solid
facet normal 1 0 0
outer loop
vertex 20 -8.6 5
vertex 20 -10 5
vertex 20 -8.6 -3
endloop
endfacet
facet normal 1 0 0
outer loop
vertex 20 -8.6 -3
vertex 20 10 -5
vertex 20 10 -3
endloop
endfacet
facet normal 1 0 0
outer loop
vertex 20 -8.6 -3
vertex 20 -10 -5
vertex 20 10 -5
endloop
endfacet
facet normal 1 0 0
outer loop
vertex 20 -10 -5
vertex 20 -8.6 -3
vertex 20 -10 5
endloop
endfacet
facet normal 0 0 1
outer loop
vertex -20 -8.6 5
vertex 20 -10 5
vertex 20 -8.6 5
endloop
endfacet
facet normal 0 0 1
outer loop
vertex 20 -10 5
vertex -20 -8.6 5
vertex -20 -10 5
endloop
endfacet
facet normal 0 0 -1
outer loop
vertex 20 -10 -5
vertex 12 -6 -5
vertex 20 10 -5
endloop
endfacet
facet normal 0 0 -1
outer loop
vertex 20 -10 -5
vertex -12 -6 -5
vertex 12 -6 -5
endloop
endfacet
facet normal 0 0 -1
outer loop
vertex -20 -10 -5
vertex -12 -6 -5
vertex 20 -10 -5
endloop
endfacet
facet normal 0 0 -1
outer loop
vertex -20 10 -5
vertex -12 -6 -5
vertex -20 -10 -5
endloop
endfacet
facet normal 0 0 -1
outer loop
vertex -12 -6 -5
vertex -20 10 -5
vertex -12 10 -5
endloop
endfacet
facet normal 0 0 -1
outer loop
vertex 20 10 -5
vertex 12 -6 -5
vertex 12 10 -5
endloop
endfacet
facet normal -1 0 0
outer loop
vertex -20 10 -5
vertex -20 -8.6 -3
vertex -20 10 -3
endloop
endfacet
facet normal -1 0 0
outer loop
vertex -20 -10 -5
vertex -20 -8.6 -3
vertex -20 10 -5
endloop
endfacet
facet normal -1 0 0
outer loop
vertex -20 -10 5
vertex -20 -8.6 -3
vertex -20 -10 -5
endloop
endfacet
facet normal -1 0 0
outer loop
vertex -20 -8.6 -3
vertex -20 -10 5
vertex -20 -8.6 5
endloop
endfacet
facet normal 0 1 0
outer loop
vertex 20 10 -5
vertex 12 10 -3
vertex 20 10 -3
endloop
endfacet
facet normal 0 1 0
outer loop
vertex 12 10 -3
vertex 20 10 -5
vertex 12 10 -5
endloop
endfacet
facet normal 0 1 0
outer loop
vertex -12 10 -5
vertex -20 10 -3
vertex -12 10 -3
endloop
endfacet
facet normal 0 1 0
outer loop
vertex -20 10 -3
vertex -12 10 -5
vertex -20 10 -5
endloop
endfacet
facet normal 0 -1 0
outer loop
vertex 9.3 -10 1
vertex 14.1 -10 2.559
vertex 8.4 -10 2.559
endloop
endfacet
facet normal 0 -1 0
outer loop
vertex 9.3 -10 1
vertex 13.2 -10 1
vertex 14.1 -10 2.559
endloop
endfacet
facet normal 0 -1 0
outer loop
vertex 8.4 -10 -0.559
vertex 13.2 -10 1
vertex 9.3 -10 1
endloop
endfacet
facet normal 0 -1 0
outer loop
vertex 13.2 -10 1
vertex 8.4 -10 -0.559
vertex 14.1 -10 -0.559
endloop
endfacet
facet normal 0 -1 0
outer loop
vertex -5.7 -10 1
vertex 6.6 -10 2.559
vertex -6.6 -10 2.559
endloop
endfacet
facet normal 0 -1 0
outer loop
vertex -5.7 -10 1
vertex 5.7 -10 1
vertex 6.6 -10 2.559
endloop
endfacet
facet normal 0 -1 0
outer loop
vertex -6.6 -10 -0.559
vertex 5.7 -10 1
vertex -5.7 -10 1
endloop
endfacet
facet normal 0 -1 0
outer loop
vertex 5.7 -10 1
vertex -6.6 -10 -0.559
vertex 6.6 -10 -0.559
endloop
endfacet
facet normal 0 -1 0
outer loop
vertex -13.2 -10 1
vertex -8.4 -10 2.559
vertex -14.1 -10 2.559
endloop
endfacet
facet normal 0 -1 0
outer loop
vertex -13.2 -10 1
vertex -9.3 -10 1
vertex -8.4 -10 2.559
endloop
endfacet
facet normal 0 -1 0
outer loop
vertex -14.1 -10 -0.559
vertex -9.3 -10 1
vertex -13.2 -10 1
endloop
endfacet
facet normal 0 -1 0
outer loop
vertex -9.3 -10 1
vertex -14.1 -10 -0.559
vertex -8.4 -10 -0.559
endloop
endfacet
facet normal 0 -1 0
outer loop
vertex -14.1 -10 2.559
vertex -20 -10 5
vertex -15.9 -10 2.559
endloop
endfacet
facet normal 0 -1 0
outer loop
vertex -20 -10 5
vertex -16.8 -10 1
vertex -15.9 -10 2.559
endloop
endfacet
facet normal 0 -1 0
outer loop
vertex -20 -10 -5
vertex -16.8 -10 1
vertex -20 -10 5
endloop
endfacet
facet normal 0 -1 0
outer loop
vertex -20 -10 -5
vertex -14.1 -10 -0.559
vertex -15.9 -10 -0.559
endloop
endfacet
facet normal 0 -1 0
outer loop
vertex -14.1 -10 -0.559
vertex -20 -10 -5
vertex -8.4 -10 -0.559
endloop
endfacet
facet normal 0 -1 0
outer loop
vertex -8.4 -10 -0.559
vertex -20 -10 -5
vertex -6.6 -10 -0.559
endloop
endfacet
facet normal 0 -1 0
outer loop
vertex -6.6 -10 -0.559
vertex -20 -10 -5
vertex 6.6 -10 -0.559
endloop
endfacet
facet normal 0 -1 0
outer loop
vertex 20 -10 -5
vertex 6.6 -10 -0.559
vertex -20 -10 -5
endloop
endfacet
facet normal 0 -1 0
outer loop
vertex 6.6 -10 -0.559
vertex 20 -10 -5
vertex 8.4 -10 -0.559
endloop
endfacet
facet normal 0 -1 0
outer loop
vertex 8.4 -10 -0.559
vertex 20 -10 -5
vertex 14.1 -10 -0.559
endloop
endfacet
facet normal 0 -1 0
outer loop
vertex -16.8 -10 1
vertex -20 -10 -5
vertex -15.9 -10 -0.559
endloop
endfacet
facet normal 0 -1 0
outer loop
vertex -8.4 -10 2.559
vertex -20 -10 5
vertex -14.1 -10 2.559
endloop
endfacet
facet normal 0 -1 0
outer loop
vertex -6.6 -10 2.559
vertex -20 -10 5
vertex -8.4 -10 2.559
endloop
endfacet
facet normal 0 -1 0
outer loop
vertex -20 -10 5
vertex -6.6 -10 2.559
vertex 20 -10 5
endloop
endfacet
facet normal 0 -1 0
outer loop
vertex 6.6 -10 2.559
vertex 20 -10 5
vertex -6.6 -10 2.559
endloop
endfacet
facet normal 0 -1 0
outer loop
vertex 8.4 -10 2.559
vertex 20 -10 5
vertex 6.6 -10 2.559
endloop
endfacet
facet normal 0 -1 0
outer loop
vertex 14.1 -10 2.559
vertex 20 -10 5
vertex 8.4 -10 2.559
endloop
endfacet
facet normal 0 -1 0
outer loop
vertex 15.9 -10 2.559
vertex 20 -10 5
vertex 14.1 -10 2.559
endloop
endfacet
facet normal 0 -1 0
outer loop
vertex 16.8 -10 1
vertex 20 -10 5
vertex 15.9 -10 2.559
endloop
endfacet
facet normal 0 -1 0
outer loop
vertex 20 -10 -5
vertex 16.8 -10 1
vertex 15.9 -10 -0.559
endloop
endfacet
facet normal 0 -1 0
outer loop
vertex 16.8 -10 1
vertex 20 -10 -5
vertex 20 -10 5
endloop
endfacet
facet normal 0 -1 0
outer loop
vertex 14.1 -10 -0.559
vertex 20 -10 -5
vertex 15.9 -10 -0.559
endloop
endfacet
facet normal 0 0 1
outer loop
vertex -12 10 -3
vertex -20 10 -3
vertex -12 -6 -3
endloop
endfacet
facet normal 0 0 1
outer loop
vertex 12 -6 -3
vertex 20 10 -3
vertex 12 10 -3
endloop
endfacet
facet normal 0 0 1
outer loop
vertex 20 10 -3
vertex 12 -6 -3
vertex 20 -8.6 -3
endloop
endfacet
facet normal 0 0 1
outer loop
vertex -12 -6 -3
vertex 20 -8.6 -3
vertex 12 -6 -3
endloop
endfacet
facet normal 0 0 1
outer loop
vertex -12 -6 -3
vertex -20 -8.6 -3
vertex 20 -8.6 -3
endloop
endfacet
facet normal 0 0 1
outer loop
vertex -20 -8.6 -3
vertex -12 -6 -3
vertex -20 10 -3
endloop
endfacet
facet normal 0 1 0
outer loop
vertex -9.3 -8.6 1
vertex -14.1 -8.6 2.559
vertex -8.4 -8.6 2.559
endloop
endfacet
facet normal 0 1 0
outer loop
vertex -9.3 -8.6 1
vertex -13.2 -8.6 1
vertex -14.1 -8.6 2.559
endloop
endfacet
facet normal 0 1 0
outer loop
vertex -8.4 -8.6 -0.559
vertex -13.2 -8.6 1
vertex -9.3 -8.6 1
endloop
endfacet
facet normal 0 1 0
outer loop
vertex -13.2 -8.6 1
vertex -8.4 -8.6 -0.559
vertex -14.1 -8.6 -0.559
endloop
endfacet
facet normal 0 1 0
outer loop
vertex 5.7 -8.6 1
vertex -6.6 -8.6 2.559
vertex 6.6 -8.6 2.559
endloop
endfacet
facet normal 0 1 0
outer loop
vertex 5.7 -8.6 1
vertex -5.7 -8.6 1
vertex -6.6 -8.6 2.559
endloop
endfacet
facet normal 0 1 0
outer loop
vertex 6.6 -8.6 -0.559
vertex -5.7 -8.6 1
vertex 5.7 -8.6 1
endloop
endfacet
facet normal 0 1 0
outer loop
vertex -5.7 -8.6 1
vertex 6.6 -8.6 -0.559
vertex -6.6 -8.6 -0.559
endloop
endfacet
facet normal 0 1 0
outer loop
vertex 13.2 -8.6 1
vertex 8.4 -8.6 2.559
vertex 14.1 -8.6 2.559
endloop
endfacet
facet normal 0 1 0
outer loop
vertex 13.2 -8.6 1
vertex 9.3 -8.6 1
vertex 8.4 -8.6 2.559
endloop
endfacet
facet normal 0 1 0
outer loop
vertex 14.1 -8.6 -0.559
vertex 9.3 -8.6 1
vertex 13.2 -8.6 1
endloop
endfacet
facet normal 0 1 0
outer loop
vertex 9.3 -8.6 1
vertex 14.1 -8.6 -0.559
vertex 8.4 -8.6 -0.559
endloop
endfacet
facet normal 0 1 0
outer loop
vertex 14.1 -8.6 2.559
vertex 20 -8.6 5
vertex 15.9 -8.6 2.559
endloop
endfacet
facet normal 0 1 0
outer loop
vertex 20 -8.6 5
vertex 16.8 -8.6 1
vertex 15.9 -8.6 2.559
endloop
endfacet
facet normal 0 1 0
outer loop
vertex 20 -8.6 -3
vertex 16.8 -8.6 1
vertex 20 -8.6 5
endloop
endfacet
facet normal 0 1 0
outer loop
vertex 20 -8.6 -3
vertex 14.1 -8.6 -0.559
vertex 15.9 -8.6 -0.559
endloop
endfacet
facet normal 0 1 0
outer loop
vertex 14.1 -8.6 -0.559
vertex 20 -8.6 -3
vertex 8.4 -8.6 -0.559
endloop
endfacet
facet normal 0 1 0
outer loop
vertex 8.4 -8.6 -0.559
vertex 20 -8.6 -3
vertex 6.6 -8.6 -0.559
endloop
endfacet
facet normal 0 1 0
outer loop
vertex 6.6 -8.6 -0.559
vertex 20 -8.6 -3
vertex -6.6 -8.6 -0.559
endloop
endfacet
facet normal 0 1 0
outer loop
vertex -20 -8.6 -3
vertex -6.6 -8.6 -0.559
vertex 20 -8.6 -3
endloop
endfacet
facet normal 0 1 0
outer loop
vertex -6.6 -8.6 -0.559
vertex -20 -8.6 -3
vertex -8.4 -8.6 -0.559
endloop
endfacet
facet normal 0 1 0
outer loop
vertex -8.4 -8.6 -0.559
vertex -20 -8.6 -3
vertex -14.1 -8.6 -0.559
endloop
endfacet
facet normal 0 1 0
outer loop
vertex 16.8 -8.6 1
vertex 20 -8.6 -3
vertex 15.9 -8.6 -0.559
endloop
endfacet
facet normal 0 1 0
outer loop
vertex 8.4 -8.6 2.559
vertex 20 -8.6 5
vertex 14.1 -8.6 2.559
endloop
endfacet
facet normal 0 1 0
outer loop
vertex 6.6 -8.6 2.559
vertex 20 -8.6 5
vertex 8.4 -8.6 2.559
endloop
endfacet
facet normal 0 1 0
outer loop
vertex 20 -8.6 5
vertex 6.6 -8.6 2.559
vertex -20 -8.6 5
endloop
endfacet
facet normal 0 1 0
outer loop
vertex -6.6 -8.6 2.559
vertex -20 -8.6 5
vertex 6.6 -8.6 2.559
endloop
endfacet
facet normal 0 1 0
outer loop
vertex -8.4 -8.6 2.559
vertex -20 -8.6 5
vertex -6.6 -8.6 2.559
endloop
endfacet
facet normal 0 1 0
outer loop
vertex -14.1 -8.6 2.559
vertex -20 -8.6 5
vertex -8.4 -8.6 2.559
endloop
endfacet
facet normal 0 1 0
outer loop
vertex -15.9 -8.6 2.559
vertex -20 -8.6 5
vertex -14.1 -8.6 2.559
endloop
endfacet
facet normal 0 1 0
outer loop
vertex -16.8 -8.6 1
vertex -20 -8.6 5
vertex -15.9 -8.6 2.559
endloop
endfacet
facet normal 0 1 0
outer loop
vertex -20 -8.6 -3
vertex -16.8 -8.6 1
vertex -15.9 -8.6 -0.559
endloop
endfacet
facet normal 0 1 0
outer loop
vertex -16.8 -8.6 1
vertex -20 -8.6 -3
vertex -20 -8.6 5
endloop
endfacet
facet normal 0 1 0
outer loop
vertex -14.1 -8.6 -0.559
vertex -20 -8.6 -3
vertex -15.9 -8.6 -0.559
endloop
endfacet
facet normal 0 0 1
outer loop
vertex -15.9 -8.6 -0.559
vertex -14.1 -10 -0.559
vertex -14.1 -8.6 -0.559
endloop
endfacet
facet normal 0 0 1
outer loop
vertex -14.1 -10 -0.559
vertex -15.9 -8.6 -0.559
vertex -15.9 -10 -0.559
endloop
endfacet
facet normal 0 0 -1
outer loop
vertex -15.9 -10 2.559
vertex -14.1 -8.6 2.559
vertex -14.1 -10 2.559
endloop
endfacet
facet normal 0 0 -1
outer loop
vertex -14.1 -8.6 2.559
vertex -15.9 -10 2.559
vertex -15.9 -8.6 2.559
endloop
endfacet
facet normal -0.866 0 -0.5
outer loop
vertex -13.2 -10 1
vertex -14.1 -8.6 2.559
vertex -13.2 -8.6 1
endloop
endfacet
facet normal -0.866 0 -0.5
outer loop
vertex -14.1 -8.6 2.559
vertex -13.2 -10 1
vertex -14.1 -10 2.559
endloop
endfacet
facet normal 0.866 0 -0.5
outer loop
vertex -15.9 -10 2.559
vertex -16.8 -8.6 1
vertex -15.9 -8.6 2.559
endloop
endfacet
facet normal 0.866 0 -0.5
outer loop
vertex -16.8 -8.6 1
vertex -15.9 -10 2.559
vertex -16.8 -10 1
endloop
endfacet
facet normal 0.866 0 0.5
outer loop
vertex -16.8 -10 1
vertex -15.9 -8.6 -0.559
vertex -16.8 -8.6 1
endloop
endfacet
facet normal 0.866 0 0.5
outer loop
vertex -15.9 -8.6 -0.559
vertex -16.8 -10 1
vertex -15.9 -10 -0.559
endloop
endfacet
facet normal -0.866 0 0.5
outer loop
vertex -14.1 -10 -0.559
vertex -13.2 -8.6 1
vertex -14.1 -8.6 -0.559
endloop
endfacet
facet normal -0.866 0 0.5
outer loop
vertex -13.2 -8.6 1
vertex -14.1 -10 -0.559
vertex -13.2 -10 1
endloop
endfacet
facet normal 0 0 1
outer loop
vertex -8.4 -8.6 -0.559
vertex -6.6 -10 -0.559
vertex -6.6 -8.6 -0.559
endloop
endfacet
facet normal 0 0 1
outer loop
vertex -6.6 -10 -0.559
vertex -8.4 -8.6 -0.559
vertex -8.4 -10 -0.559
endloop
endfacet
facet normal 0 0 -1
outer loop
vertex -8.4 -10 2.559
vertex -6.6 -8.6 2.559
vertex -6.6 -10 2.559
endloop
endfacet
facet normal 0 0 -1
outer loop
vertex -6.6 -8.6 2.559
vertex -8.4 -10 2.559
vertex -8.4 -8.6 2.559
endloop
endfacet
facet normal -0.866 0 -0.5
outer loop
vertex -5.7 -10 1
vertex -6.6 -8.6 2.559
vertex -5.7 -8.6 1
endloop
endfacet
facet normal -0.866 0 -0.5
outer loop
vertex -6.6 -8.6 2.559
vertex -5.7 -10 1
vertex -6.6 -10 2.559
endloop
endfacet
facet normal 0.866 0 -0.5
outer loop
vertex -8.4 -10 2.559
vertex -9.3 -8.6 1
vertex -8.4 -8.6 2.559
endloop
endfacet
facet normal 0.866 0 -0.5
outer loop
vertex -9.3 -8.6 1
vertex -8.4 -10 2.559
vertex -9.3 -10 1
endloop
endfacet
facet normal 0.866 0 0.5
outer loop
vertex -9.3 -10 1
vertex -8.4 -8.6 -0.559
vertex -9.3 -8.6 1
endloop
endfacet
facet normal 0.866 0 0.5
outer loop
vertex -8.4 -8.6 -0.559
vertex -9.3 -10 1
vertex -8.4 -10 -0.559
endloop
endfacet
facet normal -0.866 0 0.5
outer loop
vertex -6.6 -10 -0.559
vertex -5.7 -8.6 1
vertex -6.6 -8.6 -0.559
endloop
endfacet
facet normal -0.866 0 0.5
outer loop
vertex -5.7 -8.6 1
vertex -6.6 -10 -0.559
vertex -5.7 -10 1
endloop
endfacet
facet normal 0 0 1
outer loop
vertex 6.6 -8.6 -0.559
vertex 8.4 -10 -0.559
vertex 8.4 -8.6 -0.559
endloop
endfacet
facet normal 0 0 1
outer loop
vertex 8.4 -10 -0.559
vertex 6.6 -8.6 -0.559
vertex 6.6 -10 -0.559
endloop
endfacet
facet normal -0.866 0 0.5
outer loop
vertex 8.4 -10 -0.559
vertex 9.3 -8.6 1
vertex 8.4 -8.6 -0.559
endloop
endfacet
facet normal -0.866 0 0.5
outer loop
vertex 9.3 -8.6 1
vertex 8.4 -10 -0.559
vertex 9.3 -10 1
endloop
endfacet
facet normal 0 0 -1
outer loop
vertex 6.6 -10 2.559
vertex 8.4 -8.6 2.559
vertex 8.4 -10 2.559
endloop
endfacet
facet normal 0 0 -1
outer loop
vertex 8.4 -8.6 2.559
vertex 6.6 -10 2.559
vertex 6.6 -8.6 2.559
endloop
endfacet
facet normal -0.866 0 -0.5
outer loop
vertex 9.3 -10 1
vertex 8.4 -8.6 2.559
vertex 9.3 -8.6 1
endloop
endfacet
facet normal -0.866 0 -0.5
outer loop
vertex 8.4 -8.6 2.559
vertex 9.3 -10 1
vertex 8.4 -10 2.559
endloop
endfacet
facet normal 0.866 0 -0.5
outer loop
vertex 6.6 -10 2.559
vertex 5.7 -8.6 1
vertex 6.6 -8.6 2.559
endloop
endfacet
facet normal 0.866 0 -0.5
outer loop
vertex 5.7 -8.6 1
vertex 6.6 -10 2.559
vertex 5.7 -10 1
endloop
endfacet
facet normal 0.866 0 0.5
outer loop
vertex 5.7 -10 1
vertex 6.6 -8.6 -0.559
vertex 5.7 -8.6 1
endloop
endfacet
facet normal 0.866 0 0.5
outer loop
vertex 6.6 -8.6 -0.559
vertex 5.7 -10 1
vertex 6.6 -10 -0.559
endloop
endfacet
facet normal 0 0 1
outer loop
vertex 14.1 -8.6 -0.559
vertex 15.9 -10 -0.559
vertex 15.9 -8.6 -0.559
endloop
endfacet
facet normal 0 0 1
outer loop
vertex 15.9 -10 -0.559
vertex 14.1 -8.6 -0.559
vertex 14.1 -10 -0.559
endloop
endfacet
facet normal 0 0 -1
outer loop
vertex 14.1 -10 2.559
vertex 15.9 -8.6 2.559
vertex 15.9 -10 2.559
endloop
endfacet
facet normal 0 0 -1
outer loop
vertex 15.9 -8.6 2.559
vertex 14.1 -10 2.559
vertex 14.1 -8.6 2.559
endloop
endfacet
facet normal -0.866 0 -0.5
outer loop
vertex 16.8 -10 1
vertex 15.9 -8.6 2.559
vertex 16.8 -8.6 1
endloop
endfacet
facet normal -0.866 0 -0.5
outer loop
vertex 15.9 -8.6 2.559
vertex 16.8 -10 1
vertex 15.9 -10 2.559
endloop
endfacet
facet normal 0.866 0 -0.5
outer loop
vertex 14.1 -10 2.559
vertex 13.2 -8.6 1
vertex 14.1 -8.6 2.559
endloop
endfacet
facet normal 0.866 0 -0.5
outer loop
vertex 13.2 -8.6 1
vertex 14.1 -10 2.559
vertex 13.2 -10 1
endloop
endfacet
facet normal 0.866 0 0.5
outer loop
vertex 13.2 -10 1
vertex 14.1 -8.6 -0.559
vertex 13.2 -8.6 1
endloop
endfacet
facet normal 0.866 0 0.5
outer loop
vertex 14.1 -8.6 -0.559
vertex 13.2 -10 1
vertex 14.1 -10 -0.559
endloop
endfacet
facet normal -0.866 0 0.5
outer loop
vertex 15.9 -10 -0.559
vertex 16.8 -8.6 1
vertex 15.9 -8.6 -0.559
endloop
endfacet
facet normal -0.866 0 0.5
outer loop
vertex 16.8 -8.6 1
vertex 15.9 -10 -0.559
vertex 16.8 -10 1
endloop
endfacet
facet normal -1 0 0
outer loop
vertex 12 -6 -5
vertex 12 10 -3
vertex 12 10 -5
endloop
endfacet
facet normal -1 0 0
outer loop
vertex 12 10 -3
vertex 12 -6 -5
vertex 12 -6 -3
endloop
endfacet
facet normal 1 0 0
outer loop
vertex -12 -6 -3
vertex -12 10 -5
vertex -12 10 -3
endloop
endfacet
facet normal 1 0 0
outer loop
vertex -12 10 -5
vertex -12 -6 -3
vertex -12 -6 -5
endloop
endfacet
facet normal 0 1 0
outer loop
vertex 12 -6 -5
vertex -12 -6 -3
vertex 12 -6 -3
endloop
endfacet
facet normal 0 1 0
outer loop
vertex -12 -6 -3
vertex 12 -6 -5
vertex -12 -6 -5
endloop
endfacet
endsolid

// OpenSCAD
difference () {
  cube ([40, 20, 10], center=true);
  translate ([0, 1.4, 2]) {
    cube ([40, 20, 10], center=true);
  }
  translate ([-15, -9, 1]) {
    rotate (a=90.0, v=[1, 0, 0]) {
      cylinder (h=2, r=1.8, center=true);
    }
  }
  translate ([-7.5, -9, 1]) {
    rotate (a=90.0, v=[1, 0, 0]) {
      cylinder (h=2, r=1.8, center=true);
    }
  }
  translate ([7.5, -9, 1]) {
    rotate (a=90.0, v=[1, 0, 0]) {
      cylinder (h=2, r=1.8, center=true);
    }
  }
  translate ([15, -9, 1]) {
    rotate (a=90.0, v=[1, 0, 0]) {
      cylinder (h=2, r=1.8, center=true);
    }
  }
  translate ([0, 4, 0]) {
    cube ([24, 20, 10], center=true);
  }
}
